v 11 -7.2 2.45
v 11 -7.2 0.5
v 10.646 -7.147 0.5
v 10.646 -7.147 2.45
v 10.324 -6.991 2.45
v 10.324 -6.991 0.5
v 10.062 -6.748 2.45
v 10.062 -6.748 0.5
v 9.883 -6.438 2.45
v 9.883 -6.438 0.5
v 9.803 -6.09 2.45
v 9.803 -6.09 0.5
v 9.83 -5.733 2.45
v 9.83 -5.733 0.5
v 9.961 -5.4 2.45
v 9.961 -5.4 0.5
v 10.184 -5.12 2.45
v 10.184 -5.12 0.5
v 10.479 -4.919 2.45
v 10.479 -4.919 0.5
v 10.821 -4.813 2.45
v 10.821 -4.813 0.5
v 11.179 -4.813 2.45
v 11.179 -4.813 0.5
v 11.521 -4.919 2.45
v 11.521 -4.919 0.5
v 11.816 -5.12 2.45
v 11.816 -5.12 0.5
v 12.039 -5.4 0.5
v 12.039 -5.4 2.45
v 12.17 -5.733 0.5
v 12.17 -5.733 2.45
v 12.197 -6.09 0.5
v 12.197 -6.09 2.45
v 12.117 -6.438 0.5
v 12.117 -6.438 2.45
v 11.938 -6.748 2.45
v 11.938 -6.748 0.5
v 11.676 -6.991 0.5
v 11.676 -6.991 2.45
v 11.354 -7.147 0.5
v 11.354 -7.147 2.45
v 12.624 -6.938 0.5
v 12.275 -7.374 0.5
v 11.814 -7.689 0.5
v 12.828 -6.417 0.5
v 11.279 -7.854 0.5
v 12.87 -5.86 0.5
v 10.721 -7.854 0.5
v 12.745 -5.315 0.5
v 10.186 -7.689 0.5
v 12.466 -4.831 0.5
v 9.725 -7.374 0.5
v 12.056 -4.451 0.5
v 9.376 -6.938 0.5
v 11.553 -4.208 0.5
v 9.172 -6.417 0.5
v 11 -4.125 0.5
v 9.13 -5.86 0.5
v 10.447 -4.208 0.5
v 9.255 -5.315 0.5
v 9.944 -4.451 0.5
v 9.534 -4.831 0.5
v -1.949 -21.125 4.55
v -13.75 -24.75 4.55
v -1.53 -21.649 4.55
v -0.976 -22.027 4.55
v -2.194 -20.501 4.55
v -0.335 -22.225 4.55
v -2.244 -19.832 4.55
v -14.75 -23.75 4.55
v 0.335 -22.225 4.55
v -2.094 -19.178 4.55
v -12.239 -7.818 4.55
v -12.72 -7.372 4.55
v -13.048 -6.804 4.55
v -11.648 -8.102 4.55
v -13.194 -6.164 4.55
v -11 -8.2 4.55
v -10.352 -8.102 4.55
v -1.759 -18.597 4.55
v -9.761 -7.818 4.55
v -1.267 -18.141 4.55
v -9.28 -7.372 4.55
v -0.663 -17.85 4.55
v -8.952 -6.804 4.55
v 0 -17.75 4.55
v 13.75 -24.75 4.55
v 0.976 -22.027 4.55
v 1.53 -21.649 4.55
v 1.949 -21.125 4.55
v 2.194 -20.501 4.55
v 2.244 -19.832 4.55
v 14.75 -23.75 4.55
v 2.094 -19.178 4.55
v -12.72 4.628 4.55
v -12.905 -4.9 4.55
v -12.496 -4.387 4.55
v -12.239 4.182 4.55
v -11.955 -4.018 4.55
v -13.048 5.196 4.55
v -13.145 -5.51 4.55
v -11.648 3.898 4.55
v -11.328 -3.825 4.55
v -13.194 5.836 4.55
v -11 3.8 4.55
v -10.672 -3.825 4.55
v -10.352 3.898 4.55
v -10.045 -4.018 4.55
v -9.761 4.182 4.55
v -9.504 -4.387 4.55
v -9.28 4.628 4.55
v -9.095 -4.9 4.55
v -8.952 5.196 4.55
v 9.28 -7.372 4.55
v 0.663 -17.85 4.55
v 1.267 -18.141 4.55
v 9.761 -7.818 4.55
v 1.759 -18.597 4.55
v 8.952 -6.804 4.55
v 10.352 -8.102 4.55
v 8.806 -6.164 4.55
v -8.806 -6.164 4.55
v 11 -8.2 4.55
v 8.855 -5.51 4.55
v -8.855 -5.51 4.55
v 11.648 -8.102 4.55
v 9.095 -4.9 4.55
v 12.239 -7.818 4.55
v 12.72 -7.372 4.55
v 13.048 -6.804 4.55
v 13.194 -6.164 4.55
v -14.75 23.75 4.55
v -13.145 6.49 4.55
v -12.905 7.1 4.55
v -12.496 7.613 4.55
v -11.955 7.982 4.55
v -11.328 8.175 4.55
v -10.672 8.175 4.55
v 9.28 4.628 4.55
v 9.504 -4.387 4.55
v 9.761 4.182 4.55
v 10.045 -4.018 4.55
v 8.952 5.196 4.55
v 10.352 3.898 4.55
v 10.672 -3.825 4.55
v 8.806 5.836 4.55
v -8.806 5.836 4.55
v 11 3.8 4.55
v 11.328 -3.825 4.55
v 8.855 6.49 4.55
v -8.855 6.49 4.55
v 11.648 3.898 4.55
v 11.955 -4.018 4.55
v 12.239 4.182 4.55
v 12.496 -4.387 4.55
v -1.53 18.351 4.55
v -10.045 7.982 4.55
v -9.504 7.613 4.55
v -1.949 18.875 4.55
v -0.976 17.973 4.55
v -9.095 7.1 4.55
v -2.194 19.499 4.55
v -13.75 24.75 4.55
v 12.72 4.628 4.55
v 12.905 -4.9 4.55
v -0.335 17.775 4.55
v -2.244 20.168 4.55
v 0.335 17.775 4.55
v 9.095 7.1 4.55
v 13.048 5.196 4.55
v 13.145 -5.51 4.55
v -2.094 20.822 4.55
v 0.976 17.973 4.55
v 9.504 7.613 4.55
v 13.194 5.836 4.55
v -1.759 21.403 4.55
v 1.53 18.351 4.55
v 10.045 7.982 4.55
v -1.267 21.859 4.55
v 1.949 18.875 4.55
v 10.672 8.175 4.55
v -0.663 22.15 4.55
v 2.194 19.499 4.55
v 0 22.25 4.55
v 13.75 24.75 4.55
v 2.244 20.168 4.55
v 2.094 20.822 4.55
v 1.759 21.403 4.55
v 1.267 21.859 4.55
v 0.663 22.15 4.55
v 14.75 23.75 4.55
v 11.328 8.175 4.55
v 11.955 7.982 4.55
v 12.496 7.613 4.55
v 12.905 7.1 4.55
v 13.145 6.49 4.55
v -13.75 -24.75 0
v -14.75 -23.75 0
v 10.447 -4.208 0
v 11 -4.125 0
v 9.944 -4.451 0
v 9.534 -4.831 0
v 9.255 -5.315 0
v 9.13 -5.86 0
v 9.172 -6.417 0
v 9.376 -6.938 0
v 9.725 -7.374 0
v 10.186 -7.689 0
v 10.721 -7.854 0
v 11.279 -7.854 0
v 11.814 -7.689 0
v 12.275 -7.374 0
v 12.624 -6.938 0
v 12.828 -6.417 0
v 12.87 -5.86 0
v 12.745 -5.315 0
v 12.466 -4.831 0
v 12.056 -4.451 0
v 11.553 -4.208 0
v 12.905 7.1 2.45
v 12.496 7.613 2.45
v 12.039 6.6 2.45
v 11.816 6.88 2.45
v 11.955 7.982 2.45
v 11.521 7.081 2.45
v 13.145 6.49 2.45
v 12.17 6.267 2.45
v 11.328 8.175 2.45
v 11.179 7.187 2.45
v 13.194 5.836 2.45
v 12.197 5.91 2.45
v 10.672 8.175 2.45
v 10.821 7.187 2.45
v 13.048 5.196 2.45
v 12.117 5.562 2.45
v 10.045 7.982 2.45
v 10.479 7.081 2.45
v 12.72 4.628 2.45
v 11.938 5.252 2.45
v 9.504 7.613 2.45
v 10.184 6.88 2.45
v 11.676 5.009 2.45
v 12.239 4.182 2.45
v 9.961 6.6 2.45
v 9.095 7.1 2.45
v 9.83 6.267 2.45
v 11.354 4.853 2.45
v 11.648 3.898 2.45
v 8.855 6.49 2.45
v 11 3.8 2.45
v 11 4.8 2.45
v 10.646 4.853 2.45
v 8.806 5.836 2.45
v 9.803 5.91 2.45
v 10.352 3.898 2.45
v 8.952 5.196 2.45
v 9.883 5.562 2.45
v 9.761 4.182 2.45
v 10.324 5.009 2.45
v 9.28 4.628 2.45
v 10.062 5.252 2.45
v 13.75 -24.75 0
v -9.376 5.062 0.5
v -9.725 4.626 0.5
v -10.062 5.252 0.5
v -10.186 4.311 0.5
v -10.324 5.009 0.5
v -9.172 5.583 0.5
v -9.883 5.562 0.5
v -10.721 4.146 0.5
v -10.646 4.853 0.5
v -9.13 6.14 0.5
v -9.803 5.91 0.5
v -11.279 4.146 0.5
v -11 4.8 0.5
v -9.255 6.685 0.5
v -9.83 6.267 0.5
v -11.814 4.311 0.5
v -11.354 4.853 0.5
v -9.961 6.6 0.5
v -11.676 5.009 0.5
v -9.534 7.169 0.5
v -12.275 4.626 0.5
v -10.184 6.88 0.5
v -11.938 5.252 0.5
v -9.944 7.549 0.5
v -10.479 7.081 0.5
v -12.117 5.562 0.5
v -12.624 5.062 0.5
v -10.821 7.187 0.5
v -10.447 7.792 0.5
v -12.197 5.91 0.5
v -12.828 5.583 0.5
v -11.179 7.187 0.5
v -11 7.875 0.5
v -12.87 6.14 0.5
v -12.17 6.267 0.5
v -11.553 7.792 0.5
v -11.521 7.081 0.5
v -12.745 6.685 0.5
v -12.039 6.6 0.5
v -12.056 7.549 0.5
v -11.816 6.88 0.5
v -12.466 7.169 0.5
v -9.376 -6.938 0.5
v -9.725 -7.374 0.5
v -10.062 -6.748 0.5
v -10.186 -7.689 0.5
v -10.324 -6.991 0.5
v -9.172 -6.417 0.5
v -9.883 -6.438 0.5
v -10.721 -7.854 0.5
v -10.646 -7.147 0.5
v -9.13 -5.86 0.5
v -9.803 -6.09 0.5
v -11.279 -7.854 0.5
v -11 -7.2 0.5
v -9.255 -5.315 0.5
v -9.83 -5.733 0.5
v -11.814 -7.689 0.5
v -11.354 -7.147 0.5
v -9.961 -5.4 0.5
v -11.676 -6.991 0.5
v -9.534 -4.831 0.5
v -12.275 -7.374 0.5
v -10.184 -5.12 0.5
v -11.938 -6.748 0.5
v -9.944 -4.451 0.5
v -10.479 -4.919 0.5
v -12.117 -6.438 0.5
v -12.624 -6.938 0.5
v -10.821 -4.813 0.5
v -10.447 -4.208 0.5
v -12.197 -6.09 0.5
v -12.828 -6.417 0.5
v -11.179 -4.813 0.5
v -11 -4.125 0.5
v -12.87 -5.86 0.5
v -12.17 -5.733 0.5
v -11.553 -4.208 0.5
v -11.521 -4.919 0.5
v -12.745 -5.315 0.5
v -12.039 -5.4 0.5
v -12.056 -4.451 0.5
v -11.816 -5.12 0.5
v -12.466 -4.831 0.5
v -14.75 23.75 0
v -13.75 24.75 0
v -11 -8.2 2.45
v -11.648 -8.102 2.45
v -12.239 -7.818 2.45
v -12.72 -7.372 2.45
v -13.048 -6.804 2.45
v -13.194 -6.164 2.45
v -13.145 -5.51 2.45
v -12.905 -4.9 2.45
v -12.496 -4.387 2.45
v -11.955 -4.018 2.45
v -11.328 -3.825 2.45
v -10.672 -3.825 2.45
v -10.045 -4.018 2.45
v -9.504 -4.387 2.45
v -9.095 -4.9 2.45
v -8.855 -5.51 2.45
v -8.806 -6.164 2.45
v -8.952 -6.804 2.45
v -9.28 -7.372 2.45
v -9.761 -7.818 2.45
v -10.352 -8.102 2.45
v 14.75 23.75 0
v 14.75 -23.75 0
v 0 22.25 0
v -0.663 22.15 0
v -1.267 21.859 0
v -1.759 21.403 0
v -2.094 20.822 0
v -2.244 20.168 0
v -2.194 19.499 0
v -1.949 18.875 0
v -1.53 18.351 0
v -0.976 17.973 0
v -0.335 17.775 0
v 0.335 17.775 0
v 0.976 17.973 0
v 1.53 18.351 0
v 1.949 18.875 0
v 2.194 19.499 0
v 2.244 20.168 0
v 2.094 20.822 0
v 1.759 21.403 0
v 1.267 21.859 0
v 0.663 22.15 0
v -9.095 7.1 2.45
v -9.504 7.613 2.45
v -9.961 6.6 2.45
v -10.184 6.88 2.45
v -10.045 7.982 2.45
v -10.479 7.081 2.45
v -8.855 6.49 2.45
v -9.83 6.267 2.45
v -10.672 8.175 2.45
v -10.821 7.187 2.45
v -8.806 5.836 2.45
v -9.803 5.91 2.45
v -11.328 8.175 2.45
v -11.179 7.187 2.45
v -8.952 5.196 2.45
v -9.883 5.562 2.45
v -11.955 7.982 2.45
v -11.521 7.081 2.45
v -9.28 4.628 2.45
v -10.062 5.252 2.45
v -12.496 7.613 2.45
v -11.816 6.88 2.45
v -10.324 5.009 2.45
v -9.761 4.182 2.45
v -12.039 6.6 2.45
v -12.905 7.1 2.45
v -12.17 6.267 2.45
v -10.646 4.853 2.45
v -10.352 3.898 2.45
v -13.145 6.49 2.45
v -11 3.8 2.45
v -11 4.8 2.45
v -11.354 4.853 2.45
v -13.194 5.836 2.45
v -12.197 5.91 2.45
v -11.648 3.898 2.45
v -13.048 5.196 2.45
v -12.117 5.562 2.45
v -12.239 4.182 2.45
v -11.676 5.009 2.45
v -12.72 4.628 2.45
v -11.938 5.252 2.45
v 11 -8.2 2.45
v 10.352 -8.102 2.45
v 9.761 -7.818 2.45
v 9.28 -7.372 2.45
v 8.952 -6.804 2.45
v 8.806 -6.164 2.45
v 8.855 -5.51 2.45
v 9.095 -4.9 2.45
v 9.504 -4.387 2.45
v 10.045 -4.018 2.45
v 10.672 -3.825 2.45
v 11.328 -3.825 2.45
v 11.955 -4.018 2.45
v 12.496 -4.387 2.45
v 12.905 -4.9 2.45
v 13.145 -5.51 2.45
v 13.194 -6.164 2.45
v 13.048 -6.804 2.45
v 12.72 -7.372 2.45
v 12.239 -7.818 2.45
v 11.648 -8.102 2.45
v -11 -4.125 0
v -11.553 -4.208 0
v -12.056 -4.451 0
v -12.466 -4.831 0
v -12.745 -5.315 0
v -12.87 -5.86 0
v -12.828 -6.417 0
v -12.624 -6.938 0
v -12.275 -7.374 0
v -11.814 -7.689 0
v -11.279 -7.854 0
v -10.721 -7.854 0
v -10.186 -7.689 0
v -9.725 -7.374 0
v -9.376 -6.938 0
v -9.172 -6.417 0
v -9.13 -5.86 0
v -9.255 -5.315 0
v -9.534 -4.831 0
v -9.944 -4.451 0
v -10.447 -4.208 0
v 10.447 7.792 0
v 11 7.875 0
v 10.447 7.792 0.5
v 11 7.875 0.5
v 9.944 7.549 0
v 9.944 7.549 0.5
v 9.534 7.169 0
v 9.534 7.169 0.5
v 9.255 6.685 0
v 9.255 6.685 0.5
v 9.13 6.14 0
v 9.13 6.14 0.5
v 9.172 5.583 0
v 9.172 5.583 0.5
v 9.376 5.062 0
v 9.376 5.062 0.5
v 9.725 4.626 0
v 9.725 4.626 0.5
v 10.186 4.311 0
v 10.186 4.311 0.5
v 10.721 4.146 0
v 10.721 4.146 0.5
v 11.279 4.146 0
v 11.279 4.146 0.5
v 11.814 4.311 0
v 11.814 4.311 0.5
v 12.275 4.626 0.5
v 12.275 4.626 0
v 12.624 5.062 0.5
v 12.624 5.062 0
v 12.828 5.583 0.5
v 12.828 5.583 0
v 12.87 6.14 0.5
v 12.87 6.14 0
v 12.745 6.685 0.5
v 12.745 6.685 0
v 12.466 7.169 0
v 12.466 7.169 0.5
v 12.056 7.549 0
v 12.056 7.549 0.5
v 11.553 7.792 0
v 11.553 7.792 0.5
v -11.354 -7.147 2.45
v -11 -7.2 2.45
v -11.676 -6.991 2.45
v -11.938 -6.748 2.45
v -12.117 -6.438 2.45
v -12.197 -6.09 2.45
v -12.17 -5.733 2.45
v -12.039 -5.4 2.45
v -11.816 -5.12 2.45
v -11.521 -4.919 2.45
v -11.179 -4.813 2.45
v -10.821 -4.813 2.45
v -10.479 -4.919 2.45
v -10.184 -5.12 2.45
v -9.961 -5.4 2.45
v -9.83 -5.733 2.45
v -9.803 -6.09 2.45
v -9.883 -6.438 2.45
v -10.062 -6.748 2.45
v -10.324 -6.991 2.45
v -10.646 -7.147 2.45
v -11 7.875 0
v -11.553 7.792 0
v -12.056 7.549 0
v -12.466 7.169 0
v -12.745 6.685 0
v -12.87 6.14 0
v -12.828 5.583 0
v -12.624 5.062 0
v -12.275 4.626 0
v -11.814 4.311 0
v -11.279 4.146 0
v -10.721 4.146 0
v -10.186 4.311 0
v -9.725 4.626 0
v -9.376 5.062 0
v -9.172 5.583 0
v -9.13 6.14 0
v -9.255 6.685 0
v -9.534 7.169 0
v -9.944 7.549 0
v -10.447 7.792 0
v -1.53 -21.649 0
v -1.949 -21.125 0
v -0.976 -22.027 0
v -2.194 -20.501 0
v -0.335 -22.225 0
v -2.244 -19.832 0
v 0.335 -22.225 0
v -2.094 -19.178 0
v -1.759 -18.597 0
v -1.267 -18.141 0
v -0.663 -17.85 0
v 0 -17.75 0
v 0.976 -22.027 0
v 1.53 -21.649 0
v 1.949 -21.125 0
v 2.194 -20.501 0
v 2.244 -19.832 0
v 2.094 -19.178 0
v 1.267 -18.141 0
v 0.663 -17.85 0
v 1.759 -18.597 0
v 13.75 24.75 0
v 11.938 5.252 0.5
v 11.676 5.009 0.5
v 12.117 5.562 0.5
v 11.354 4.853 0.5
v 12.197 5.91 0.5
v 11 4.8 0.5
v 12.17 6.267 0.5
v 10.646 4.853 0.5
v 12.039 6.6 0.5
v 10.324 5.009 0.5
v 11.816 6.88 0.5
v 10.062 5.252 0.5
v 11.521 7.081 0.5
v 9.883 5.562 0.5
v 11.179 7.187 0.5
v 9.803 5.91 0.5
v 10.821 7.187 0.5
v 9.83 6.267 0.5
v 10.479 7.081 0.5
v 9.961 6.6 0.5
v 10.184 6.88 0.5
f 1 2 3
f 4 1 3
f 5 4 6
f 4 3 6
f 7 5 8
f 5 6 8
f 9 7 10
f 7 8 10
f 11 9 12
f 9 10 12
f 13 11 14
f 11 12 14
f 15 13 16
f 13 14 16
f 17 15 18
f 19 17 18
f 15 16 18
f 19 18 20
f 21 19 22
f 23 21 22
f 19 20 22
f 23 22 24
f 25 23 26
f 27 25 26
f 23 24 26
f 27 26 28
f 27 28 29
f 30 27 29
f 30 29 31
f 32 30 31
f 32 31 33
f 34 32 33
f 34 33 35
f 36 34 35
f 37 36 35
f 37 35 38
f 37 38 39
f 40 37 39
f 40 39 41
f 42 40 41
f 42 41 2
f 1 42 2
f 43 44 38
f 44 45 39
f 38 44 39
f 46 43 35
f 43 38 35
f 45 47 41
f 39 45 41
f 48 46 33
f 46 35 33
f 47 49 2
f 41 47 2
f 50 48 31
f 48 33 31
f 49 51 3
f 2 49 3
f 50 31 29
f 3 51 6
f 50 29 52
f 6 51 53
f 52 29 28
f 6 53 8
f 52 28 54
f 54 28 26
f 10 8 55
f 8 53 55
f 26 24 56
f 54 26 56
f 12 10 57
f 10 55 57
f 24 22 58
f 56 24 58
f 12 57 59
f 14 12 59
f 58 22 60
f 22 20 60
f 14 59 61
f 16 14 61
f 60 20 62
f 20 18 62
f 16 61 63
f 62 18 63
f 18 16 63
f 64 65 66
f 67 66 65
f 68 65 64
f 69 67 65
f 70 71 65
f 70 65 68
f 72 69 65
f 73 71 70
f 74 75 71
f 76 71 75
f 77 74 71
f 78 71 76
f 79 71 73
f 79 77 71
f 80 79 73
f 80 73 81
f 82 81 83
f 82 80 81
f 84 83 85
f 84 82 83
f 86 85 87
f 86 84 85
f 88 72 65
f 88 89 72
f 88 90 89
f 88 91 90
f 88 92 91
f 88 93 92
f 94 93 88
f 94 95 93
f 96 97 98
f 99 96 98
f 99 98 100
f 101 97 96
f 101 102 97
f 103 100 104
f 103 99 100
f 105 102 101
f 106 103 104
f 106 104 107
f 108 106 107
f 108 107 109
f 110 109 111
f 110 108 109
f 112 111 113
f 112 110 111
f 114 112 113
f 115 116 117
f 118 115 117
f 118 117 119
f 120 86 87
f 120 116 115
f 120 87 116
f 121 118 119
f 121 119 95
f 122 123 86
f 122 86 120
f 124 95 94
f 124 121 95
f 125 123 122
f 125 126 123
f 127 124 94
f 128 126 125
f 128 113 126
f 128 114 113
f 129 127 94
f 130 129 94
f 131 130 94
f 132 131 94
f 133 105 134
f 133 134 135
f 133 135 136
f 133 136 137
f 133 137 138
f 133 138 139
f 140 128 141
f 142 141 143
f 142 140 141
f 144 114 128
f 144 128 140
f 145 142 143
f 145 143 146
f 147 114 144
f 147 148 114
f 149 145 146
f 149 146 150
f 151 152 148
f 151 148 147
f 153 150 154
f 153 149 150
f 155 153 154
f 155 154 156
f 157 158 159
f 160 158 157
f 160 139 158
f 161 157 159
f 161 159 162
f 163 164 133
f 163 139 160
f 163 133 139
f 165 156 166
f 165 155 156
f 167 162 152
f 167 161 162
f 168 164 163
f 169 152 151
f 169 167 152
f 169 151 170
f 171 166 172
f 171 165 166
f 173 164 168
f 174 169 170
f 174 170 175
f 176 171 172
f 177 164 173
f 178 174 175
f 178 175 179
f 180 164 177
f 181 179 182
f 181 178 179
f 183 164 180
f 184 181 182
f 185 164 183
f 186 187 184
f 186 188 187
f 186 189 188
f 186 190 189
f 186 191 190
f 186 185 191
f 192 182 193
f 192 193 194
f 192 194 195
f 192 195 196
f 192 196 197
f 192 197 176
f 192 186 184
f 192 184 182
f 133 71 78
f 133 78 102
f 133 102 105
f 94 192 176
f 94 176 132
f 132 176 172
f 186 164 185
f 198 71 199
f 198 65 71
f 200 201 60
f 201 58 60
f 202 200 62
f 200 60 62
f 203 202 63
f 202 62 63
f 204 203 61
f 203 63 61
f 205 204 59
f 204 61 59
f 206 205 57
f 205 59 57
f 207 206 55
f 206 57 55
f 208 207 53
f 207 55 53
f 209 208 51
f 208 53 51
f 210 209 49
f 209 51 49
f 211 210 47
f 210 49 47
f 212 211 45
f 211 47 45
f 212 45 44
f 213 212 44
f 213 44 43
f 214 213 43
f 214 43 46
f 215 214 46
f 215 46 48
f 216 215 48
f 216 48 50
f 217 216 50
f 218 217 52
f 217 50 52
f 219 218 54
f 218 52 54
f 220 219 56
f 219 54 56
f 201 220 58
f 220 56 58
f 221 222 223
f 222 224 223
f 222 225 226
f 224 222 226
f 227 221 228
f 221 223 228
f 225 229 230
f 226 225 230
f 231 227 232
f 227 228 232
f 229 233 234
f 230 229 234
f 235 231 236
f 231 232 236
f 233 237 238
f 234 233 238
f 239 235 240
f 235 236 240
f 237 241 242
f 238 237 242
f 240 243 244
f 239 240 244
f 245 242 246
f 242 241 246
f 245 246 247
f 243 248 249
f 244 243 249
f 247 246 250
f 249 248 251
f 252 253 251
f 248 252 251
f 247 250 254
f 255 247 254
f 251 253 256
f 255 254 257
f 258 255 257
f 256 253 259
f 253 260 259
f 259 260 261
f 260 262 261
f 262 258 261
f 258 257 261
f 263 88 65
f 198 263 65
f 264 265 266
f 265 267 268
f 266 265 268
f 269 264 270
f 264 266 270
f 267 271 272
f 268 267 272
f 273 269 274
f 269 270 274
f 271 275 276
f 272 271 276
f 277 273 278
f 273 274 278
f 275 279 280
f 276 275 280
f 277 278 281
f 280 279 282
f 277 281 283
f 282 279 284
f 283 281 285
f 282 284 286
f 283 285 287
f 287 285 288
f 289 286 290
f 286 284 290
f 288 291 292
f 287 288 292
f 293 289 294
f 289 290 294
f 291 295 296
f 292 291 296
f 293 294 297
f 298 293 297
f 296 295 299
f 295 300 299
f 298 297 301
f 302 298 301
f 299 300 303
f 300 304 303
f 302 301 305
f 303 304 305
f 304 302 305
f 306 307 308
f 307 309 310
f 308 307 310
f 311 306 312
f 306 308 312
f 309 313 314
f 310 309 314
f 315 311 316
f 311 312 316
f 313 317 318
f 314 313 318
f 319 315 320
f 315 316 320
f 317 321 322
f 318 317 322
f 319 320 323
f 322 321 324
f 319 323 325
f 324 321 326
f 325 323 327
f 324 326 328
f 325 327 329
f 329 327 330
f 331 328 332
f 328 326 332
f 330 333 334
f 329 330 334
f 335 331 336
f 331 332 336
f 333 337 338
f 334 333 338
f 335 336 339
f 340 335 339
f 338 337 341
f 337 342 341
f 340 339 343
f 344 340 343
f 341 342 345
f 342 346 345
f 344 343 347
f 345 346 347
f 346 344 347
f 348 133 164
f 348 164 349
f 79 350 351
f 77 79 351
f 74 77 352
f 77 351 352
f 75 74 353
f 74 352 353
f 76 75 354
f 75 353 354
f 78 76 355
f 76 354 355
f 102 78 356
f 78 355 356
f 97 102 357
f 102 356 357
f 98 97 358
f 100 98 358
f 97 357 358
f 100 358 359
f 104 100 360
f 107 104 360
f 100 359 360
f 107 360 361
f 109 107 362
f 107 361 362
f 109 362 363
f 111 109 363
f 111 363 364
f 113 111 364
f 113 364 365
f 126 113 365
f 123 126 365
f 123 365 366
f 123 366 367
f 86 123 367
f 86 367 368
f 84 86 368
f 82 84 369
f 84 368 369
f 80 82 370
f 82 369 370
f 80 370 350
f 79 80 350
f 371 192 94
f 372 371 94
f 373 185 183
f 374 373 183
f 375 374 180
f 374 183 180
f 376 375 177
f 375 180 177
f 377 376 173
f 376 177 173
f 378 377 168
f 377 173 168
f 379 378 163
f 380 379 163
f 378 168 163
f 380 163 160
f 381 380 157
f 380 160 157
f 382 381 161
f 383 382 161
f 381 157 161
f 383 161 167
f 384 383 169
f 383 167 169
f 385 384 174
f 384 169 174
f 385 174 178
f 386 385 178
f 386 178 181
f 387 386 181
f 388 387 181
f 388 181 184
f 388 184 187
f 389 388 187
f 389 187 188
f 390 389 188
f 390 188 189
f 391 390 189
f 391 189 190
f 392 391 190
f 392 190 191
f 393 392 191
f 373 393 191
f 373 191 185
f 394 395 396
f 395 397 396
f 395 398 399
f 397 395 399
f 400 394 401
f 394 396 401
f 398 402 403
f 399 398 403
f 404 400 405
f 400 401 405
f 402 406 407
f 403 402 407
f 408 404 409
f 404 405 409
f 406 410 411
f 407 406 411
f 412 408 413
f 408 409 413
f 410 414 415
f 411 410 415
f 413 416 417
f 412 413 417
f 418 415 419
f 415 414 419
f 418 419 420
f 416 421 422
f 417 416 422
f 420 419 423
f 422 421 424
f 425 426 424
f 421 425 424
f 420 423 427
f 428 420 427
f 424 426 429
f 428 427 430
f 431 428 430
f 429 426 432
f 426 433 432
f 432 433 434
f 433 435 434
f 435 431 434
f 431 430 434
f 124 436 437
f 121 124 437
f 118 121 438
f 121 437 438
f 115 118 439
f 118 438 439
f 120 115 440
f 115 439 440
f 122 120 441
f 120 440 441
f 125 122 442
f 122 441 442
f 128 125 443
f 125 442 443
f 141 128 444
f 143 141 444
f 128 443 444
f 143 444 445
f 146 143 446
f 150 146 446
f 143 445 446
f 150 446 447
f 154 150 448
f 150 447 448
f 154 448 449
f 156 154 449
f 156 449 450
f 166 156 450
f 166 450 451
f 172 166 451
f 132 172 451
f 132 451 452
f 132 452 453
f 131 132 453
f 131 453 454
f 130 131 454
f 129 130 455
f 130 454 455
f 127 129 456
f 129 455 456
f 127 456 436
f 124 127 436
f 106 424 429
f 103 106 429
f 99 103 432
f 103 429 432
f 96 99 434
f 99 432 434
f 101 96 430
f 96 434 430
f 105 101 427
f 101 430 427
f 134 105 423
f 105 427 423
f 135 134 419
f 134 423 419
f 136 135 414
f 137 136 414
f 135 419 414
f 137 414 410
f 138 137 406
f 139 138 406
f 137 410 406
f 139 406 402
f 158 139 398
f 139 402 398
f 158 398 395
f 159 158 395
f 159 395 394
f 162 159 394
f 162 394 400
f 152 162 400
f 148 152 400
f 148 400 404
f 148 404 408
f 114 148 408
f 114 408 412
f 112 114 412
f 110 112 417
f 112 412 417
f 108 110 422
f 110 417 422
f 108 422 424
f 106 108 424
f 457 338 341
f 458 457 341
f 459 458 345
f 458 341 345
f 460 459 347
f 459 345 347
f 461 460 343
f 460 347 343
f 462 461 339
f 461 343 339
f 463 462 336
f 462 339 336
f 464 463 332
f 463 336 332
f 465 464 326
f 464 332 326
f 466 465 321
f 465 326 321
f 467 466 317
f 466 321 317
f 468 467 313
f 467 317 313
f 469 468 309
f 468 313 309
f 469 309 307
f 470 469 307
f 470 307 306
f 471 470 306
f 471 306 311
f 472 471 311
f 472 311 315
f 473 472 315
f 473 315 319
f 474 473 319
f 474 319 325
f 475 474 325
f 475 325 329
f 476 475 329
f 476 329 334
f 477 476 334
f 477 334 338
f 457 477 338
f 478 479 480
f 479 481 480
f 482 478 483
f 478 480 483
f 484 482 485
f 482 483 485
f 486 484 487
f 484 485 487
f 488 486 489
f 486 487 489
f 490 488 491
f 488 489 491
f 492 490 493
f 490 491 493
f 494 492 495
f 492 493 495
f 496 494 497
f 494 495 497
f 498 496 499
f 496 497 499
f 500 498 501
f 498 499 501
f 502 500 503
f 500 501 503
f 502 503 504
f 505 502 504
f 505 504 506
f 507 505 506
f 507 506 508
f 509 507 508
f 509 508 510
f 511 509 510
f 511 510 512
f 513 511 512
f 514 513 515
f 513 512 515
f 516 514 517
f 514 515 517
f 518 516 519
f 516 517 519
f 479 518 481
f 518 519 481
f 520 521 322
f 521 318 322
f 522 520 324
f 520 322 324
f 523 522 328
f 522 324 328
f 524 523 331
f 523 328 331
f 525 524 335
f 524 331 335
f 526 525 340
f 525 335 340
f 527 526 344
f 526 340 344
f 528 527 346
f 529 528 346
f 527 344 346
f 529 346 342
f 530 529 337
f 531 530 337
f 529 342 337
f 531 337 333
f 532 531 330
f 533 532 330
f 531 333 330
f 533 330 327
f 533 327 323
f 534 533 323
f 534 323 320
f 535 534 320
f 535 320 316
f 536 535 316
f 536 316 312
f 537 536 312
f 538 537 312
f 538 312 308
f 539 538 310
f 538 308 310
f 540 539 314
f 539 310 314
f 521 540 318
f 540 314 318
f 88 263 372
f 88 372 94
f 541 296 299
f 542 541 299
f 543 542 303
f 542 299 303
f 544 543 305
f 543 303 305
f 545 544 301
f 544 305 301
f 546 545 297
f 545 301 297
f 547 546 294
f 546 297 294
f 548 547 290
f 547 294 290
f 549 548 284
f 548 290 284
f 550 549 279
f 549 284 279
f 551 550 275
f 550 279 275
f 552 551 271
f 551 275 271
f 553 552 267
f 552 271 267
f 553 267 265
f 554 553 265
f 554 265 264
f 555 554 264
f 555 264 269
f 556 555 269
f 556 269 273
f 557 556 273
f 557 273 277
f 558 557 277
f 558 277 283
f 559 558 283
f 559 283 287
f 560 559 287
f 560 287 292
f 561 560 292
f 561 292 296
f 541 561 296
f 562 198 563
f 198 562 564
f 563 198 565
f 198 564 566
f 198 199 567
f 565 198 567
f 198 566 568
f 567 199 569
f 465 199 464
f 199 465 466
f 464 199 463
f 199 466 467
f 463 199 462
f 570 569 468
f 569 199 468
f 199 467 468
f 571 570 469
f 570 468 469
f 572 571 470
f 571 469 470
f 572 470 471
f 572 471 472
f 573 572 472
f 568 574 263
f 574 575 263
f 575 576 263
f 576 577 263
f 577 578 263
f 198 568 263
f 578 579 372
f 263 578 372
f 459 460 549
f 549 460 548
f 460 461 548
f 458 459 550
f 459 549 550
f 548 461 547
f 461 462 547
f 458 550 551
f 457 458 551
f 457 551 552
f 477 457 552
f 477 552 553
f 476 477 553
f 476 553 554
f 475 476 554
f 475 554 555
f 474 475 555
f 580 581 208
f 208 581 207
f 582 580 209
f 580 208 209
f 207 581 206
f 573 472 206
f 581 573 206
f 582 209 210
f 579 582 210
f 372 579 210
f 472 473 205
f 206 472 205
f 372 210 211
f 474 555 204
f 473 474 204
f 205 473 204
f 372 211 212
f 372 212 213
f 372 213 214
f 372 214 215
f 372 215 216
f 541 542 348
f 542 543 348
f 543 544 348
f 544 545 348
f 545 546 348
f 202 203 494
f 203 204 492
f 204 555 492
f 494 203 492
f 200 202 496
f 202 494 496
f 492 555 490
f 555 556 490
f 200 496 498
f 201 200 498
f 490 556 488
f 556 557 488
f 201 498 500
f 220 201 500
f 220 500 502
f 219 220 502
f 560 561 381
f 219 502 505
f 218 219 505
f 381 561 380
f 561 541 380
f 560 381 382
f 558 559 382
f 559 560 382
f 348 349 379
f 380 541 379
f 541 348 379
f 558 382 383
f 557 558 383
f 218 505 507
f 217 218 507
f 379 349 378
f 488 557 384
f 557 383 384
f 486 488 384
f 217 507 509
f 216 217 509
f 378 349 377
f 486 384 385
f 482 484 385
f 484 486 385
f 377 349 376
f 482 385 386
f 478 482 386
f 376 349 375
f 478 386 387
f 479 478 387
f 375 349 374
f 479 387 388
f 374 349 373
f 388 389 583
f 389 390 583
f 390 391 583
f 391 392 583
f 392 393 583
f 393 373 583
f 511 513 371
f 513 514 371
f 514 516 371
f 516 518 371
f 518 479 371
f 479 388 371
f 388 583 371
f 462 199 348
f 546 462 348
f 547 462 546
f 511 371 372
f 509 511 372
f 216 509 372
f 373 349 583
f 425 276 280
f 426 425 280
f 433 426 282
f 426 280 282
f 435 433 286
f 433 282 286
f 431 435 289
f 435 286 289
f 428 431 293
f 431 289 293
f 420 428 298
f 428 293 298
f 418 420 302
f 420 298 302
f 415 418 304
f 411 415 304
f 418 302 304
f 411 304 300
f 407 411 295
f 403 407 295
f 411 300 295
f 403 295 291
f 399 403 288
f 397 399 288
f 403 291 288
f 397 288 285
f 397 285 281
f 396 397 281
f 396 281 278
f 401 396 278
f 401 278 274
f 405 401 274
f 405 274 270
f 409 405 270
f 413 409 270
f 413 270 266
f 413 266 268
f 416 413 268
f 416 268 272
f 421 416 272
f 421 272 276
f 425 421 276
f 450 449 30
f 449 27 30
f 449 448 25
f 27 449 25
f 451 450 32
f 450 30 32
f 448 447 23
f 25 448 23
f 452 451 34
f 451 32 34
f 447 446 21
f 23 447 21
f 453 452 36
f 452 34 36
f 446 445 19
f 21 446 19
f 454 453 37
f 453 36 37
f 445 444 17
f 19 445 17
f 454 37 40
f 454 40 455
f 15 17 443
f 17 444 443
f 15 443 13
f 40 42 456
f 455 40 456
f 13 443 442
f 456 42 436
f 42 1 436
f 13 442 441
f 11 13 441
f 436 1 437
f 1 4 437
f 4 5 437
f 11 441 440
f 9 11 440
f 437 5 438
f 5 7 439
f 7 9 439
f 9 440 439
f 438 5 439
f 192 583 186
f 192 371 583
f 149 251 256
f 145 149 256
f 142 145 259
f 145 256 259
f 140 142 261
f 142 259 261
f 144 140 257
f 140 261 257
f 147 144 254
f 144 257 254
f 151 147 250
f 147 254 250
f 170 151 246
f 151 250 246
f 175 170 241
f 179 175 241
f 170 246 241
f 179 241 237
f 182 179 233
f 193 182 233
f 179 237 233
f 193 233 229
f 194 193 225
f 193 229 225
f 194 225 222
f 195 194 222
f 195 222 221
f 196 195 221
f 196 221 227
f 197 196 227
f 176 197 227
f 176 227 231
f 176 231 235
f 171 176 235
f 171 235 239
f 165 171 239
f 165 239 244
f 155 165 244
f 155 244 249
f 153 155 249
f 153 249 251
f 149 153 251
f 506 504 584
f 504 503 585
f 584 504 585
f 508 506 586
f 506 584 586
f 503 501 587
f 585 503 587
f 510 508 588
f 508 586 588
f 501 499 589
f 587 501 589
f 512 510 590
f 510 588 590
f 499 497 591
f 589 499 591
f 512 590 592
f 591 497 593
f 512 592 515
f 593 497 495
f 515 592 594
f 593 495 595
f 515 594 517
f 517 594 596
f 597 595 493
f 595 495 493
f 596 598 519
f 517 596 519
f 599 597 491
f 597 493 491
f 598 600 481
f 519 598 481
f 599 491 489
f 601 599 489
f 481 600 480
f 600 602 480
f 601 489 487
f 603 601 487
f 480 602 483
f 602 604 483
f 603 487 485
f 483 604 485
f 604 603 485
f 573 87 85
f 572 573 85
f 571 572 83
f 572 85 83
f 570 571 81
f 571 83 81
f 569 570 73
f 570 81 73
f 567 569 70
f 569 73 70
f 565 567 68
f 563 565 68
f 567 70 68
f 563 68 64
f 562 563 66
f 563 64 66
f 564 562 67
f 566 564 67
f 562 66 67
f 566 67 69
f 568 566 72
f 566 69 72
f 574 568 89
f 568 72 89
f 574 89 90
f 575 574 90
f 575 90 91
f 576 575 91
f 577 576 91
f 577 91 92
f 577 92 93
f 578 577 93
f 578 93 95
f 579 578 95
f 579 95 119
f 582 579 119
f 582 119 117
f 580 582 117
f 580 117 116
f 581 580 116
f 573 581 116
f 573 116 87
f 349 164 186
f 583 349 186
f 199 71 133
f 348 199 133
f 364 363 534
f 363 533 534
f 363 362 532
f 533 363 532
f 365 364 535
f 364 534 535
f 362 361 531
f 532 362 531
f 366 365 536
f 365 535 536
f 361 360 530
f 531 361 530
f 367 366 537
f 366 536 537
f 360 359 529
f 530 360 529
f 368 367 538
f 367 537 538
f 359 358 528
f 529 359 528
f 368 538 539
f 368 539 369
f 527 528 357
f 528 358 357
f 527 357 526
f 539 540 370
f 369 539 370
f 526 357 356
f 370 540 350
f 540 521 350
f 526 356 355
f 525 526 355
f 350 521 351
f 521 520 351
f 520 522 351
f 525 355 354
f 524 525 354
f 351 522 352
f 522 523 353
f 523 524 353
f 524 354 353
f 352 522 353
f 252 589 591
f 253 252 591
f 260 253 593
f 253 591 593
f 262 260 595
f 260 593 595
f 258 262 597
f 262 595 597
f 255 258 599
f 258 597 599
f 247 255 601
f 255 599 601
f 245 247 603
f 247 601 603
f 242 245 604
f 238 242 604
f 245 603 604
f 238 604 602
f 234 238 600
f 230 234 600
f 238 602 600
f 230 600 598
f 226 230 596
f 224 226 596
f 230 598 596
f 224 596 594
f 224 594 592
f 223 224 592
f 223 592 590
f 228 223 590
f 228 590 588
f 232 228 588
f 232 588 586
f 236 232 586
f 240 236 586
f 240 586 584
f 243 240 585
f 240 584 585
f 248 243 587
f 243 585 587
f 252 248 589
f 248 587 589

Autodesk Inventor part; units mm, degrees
ref_plane "YZ Plane" through (0, 0, 0) normal (1, 0, 0) x (0, 1, 0)
ref_plane "XZ Plane" through (0, 0, 0) normal (0, 1, 0) x (-1, 0, 0)
ref_plane "XY Plane" through (0, 0, 0) normal (0, 0, 1) x (1, 0, 0)
sketch "Sketch1" plane through (0, 0, 0) normal (0, 0, 1) x (1, 0, 0)
  line L0 (-14.75, -15.25) -> (14.75, -15.25)
  line L1 (14.75, -15.25) -> (14.75, 15.25)
  line L2 (14.75, 15.25) -> (-14.75, 15.25)
  line L3 (-14.75, 15.25) -> (-14.75, -15.25)
  line L4 (-14.75, -15.25) -> (14.75, 15.25) construction
  line L5 (14.75, -15.25) -> (-14.75, 15.25) construction
  point P0 (0, 0)
  dimension "WIDTH" = 29.5
  dimension "LENGTH" = 30.5
extrude "Extrusion1" add sketch "Sketch1" along normal blind 4.55
sketch "Sketch4" plane through (0, 0, 4.55) normal (0, 0, 1) x (1, 0, 0)
  line L0 (-14.75, 24.75) -> (14.75, 24.75)
  line L1 (14.75, 24.75) -> (14.75, -24.75)
  line L2 (14.75, -24.75) -> (-14.75, -24.75)
  line L3 (-14.75, -24.75) -> (-14.75, 24.75)
  line L4 (-14.75, 24.75) -> (14.75, -24.75) construction
  line L5 (14.75, 24.75) -> (-14.75, -24.75) construction
  point P0 (0, 0)
  dimension "LENGTH_WHOLE" = 49.5
  dimension "d30" = 29.5
extrude "Extrusion2" add sketch "Sketch4" against normal blind 4.55
sketch "Sketch2" plane through (0, 0, 4.55) normal (0, 0, 1) x (1, 0, 0)
  point P0 (0, 0)
  point P1 (-11, 6)
  point P2 (11, 6)
  point P3 (-11, -6)
  point P4 (11, -6)
  dimension "d11" = 22
  dimension "d12" = 0
  dimension "d13" = 0
  dimension "d14" = 0
  dimension "d15" = 0
  dimension "d16" = 12
  dimension "d17" = 6
  dimension "d18" = 11
hole "Hole1" at (-11, 6, 4.55) at (11, 6, 4.55) at (-11, -6, 4.55) at (11, -6, 4.55) direction (0, 0, -1) diameter 2.4 end through all counterbore diameter 4.4 counterbore depth 2.1 clearance for "Socket Head Cap Screw" size "M2" standard "Ansi Metric M Profile"
sketch "Sketch5" plane through (0, 0, 0) normal (0, 0, -1) x (-1, 0, 0)
  point P0 (0, 0)
  point P1 (0, 20)
  point P2 (0, -20)
  dimension "d40" = 0
  dimension "d41" = 0
  dimension "d42" = 20
  dimension "d43" = 40
hole "Hole3" at (0, 20, 0) at (0, -20, 0) direction (0, 0, 1) diameter 4.5 end through all clearance for "Socket Head Cap Screw" size "#8" standard "Ansi Unified Screw Threads"
sketch "Sketch9" plane through (0, 0, 0) normal (0, 0, -1) x (-1, 0, 0)
  circle A0 centre (11, 6) radius 1.2 projected
  point P0 (0, 0)
  point P1 (11, -6)
  point P2 (-11, 6)
  point P3 (-11, -6)
  dimension "d79" = 0
  dimension "d80" = 0
  dimension "d81" = 0
  dimension "d82" = 12
  dimension "d83" = 0
  dimension "d84" = 22
  dimension "d85" = 0
  dimension "d86" = 0
hole "Hole6" at (-11, 6, 0) at (-11, -6, 0) at (11, 6, 0) at (11, -6, 0) direction (0, 0, 1) diameter 3.75 depth 0.5
chamfer "Chamfer3" distance 1 angle 45 4 edges at (14.75, -24.75, 2.275) (-14.75, -24.75, 2.275) (-14.75, 24.75, 2.275) (14.75, 24.75, 2.275)
equation "\"d30\" = WIDTH"
equation "\"d43\" = 2 * d42"
properties part number "camera_mount"
